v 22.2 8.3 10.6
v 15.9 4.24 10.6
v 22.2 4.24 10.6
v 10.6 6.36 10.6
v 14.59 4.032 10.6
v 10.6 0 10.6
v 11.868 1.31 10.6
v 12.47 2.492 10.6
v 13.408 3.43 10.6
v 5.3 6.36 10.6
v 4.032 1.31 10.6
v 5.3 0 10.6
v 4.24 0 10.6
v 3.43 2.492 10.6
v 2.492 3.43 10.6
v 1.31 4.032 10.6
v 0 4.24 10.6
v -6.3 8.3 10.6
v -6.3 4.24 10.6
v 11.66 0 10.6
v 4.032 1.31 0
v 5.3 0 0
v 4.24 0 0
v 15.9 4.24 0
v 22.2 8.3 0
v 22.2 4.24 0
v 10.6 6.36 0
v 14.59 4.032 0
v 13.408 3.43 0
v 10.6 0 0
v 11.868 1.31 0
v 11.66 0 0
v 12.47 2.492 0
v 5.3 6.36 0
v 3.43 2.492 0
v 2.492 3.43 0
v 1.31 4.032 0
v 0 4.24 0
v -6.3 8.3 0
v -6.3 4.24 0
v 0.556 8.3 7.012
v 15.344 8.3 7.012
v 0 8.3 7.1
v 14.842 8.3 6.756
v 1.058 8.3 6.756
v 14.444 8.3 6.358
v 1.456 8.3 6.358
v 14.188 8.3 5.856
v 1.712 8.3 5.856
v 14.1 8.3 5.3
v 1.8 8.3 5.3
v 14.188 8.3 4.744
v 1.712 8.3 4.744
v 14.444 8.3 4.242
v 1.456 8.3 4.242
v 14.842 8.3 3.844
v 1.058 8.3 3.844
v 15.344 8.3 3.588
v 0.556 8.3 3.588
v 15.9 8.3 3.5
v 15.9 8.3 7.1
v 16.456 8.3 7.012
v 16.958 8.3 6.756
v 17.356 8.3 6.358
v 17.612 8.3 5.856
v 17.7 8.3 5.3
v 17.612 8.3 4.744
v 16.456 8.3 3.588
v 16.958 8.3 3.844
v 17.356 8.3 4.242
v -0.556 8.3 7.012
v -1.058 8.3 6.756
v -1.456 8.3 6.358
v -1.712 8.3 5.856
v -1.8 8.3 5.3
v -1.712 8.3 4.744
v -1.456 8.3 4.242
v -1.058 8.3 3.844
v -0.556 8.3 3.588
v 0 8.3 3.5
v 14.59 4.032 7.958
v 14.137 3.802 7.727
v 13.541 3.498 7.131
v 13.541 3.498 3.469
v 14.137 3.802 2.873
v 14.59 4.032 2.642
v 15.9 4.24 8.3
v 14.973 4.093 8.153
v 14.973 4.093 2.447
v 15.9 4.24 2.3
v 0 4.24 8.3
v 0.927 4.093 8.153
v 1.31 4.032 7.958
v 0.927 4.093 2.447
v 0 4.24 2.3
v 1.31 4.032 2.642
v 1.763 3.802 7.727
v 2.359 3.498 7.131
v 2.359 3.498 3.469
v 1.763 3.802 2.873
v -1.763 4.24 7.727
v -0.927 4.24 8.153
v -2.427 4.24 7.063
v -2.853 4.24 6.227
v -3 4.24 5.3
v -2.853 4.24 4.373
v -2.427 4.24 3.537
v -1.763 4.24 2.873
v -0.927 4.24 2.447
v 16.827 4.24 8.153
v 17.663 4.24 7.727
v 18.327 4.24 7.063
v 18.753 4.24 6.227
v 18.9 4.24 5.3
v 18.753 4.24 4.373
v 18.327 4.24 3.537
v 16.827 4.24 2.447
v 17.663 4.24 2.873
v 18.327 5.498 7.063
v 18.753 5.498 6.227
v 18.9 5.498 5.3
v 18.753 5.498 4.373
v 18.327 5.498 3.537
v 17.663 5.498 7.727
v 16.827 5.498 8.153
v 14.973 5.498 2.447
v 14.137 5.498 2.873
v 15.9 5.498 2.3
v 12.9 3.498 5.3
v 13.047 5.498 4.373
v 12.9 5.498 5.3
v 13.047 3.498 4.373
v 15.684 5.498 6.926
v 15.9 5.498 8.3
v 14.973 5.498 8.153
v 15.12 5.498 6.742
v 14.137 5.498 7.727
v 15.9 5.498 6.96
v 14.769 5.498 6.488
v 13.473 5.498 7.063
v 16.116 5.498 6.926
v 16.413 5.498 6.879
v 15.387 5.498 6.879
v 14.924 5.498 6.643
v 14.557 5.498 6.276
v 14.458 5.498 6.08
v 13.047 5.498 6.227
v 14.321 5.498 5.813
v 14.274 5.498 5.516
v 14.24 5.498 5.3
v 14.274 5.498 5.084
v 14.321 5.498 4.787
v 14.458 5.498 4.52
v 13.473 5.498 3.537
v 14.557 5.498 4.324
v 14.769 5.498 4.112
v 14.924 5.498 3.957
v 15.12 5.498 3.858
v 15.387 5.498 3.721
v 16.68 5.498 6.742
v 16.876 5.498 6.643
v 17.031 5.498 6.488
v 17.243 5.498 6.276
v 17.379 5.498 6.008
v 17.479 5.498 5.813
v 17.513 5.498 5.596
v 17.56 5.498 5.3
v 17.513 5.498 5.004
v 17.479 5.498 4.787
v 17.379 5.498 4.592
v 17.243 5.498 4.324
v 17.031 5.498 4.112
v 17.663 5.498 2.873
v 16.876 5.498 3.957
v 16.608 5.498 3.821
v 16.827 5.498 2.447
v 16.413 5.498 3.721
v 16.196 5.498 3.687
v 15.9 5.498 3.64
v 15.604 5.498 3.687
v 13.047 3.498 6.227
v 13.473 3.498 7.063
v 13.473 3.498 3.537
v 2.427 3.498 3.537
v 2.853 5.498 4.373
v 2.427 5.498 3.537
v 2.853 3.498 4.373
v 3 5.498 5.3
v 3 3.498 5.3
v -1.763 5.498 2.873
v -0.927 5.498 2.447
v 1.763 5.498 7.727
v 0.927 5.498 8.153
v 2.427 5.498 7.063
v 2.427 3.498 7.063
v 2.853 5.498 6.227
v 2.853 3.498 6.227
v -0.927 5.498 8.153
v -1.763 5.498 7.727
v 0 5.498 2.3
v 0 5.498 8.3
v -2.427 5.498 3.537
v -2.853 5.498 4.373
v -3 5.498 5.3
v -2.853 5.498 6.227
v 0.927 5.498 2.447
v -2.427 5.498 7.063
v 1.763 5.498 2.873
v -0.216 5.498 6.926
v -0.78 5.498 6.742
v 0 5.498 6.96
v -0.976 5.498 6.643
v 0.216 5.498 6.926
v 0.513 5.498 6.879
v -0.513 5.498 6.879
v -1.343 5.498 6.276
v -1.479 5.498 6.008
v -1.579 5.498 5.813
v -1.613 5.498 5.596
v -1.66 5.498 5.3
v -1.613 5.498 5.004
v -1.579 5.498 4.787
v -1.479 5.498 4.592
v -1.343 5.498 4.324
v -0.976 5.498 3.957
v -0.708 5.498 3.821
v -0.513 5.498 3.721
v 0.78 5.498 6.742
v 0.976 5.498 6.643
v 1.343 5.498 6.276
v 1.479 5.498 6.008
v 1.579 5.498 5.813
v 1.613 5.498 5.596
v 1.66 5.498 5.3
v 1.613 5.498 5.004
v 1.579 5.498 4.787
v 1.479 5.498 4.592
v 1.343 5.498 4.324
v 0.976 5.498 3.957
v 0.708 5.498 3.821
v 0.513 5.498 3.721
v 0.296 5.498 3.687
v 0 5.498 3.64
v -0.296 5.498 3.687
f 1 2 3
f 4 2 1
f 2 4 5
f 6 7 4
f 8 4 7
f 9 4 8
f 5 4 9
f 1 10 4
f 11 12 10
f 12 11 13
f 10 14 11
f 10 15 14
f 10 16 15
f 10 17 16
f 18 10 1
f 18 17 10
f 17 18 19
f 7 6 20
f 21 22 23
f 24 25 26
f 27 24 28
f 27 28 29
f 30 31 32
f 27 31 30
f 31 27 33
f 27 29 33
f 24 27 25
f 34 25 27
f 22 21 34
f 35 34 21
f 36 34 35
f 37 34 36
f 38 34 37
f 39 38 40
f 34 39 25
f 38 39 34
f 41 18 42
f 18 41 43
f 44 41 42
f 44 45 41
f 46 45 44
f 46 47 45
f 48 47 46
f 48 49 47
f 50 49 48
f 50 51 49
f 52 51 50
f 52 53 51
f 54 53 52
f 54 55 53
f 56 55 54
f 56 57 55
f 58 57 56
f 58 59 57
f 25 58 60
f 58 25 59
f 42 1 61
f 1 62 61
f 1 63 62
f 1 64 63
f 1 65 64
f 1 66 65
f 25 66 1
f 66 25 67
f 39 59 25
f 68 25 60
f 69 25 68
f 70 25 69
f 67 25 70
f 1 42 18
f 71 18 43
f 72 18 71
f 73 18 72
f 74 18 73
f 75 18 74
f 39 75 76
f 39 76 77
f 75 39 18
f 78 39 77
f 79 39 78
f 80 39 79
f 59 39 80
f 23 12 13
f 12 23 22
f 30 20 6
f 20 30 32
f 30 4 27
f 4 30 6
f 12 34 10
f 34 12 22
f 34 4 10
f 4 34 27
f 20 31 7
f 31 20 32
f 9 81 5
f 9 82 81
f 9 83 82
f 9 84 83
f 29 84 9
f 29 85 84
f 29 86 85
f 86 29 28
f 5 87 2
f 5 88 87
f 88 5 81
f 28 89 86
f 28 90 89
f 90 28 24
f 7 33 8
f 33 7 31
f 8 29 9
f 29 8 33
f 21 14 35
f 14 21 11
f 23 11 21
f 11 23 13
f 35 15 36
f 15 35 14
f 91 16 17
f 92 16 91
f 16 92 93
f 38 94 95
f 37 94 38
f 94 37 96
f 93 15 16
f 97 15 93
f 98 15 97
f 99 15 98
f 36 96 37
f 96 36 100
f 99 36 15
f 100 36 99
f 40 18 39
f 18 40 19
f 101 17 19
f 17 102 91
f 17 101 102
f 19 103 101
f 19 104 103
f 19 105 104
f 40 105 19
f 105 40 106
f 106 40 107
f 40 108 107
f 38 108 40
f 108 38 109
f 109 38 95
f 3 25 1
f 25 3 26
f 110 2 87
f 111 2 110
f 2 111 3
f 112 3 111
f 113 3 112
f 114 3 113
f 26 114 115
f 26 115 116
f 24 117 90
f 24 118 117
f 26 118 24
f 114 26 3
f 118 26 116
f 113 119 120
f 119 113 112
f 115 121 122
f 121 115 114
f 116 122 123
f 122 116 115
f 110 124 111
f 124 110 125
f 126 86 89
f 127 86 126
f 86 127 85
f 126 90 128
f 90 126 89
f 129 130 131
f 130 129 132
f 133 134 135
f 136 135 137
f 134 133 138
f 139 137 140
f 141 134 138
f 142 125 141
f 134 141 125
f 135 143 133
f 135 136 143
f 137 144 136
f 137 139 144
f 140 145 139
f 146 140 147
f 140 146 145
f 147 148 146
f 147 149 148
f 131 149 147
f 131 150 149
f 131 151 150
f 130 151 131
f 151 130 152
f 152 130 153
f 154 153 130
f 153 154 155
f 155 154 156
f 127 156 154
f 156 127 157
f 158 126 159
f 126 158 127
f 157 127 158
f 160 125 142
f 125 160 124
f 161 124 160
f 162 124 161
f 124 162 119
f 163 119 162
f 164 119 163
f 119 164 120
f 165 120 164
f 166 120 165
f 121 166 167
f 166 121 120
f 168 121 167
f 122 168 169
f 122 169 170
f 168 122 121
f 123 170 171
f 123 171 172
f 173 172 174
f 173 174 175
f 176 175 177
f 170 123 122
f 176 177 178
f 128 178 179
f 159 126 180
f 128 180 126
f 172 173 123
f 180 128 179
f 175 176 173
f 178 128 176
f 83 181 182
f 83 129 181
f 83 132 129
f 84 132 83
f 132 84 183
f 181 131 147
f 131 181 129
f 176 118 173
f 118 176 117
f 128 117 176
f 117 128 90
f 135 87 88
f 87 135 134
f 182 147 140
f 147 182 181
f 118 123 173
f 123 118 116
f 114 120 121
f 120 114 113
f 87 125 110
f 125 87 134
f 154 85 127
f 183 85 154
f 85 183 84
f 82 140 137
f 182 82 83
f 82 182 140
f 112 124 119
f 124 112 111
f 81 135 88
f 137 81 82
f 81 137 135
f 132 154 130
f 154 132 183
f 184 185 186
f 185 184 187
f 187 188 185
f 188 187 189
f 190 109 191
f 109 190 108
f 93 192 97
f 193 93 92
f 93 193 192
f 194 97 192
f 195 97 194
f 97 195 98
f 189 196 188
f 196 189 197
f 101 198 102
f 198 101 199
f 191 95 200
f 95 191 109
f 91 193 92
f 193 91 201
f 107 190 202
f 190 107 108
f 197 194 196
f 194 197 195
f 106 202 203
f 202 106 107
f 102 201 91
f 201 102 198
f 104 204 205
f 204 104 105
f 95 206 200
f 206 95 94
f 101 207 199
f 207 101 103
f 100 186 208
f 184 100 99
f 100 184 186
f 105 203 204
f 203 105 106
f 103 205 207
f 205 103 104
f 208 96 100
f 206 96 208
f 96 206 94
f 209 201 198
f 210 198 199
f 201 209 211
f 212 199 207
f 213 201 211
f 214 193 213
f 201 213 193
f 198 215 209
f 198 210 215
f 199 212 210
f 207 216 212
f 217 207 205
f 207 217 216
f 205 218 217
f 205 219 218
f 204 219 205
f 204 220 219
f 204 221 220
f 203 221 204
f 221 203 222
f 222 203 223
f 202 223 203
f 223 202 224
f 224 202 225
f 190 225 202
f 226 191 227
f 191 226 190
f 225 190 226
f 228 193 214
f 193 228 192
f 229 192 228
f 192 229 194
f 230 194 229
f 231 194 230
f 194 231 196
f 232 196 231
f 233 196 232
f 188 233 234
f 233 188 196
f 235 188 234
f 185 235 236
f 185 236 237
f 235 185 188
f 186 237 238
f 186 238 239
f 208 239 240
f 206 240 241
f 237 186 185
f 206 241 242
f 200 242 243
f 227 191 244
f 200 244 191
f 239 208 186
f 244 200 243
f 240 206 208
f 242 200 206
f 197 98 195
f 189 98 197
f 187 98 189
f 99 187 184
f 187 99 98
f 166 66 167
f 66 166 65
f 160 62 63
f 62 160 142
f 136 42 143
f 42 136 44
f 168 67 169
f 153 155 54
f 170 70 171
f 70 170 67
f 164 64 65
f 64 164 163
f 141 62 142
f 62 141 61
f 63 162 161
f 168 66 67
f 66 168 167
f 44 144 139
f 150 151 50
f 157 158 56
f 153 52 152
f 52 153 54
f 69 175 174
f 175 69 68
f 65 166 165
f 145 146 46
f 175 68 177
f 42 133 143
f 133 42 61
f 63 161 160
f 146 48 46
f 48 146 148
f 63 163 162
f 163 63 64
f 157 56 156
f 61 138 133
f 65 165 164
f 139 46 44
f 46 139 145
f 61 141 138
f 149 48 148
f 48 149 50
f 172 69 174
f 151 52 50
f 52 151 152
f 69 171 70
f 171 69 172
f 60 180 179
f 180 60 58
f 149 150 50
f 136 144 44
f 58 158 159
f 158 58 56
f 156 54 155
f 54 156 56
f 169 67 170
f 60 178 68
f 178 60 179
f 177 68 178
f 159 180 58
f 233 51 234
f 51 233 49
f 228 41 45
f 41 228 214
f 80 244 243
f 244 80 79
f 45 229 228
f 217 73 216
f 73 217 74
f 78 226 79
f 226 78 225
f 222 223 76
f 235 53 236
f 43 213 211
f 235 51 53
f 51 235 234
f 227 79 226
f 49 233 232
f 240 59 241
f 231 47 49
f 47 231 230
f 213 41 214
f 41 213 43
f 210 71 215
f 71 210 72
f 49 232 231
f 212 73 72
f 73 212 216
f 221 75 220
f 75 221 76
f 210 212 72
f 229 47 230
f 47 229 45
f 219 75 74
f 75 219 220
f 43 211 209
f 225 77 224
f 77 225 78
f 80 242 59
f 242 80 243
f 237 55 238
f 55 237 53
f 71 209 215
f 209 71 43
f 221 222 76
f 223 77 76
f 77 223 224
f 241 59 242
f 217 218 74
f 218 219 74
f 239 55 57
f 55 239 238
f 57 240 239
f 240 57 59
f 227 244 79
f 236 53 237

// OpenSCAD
DividerWidth = 5.3;
HasPlugs = true;
BaseWidth = DividerWidth * 3;
TotalHeight = DividerWidth*2;
BaseHeight = 3;
DividerHeight = DividerWidth;
WallThickness = 1.4;

$fn=20;
difference(){    
    union(){        
        difference(){
            //initial "cube" to create plywood cutout and "ramps"
            cube([BaseWidth,DividerWidth+BaseHeight,TotalHeight]);
            //cutout for plywood
            translate([DividerWidth,-DividerWidth*.2,0]) {
                cube([DividerWidth,DividerWidth*1.4,TotalHeight],center=false);
                
            }
            
            //carve out "ramps"
            translate([BaseWidth,0,0]) {
                cylinder(TotalHeight*1.1,DividerWidth*.8,DividerWidth*.8,center=false);         
            }                     
           cylinder(TotalHeight*1.1,DividerWidth*.8,DividerWidth*.8,center=false);
        }
      //extend base
        union(){
            translate([-DividerWidth-1,DividerWidth*.8,0]){
               cube([DividerWidth+1,DividerWidth*.2+BaseHeight,TotalHeight]);
            }
            translate([BaseWidth,DividerWidth*.8,]){
                cube([DividerWidth+1,DividerWidth*.2+BaseHeight,TotalHeight]);
            }
        }    
    }
    //two screw countersinks
    translate([BaseWidth,DividerWidth*0.66,TotalHeight/2])rotate([-90,0,0]) {
         cylinder(2,3,3); 
    }
    translate([0,DividerWidth*0.66,TotalHeight/2])rotate([-90,0,0]) {
         cylinder(2,3,3);     
    } 
    //pilot holes
    translate([BaseWidth,DividerWidth+BaseHeight,TotalHeight/2])rotate([90,0,0]) {
        cylinder(BaseHeight*2,1.8,1.5);        
    }   
    translate([0,DividerWidth+BaseHeight,TotalHeight/2])rotate([90,0,0]) {
        cylinder(BaseHeight*2,1.8,1.5);        
    }   
}
module screw_countersunk(
        l=20,   //length
        dh = 6,   //head dia
        lh = 3,   //head length
        ds = 2.5,  //shaft dia
        )
{
    union() {
        cylinder(h=lh, r1=dh/2, r2=ds/2, $fn=20);
        polyhole(h=l, d=ds);
    }
}
